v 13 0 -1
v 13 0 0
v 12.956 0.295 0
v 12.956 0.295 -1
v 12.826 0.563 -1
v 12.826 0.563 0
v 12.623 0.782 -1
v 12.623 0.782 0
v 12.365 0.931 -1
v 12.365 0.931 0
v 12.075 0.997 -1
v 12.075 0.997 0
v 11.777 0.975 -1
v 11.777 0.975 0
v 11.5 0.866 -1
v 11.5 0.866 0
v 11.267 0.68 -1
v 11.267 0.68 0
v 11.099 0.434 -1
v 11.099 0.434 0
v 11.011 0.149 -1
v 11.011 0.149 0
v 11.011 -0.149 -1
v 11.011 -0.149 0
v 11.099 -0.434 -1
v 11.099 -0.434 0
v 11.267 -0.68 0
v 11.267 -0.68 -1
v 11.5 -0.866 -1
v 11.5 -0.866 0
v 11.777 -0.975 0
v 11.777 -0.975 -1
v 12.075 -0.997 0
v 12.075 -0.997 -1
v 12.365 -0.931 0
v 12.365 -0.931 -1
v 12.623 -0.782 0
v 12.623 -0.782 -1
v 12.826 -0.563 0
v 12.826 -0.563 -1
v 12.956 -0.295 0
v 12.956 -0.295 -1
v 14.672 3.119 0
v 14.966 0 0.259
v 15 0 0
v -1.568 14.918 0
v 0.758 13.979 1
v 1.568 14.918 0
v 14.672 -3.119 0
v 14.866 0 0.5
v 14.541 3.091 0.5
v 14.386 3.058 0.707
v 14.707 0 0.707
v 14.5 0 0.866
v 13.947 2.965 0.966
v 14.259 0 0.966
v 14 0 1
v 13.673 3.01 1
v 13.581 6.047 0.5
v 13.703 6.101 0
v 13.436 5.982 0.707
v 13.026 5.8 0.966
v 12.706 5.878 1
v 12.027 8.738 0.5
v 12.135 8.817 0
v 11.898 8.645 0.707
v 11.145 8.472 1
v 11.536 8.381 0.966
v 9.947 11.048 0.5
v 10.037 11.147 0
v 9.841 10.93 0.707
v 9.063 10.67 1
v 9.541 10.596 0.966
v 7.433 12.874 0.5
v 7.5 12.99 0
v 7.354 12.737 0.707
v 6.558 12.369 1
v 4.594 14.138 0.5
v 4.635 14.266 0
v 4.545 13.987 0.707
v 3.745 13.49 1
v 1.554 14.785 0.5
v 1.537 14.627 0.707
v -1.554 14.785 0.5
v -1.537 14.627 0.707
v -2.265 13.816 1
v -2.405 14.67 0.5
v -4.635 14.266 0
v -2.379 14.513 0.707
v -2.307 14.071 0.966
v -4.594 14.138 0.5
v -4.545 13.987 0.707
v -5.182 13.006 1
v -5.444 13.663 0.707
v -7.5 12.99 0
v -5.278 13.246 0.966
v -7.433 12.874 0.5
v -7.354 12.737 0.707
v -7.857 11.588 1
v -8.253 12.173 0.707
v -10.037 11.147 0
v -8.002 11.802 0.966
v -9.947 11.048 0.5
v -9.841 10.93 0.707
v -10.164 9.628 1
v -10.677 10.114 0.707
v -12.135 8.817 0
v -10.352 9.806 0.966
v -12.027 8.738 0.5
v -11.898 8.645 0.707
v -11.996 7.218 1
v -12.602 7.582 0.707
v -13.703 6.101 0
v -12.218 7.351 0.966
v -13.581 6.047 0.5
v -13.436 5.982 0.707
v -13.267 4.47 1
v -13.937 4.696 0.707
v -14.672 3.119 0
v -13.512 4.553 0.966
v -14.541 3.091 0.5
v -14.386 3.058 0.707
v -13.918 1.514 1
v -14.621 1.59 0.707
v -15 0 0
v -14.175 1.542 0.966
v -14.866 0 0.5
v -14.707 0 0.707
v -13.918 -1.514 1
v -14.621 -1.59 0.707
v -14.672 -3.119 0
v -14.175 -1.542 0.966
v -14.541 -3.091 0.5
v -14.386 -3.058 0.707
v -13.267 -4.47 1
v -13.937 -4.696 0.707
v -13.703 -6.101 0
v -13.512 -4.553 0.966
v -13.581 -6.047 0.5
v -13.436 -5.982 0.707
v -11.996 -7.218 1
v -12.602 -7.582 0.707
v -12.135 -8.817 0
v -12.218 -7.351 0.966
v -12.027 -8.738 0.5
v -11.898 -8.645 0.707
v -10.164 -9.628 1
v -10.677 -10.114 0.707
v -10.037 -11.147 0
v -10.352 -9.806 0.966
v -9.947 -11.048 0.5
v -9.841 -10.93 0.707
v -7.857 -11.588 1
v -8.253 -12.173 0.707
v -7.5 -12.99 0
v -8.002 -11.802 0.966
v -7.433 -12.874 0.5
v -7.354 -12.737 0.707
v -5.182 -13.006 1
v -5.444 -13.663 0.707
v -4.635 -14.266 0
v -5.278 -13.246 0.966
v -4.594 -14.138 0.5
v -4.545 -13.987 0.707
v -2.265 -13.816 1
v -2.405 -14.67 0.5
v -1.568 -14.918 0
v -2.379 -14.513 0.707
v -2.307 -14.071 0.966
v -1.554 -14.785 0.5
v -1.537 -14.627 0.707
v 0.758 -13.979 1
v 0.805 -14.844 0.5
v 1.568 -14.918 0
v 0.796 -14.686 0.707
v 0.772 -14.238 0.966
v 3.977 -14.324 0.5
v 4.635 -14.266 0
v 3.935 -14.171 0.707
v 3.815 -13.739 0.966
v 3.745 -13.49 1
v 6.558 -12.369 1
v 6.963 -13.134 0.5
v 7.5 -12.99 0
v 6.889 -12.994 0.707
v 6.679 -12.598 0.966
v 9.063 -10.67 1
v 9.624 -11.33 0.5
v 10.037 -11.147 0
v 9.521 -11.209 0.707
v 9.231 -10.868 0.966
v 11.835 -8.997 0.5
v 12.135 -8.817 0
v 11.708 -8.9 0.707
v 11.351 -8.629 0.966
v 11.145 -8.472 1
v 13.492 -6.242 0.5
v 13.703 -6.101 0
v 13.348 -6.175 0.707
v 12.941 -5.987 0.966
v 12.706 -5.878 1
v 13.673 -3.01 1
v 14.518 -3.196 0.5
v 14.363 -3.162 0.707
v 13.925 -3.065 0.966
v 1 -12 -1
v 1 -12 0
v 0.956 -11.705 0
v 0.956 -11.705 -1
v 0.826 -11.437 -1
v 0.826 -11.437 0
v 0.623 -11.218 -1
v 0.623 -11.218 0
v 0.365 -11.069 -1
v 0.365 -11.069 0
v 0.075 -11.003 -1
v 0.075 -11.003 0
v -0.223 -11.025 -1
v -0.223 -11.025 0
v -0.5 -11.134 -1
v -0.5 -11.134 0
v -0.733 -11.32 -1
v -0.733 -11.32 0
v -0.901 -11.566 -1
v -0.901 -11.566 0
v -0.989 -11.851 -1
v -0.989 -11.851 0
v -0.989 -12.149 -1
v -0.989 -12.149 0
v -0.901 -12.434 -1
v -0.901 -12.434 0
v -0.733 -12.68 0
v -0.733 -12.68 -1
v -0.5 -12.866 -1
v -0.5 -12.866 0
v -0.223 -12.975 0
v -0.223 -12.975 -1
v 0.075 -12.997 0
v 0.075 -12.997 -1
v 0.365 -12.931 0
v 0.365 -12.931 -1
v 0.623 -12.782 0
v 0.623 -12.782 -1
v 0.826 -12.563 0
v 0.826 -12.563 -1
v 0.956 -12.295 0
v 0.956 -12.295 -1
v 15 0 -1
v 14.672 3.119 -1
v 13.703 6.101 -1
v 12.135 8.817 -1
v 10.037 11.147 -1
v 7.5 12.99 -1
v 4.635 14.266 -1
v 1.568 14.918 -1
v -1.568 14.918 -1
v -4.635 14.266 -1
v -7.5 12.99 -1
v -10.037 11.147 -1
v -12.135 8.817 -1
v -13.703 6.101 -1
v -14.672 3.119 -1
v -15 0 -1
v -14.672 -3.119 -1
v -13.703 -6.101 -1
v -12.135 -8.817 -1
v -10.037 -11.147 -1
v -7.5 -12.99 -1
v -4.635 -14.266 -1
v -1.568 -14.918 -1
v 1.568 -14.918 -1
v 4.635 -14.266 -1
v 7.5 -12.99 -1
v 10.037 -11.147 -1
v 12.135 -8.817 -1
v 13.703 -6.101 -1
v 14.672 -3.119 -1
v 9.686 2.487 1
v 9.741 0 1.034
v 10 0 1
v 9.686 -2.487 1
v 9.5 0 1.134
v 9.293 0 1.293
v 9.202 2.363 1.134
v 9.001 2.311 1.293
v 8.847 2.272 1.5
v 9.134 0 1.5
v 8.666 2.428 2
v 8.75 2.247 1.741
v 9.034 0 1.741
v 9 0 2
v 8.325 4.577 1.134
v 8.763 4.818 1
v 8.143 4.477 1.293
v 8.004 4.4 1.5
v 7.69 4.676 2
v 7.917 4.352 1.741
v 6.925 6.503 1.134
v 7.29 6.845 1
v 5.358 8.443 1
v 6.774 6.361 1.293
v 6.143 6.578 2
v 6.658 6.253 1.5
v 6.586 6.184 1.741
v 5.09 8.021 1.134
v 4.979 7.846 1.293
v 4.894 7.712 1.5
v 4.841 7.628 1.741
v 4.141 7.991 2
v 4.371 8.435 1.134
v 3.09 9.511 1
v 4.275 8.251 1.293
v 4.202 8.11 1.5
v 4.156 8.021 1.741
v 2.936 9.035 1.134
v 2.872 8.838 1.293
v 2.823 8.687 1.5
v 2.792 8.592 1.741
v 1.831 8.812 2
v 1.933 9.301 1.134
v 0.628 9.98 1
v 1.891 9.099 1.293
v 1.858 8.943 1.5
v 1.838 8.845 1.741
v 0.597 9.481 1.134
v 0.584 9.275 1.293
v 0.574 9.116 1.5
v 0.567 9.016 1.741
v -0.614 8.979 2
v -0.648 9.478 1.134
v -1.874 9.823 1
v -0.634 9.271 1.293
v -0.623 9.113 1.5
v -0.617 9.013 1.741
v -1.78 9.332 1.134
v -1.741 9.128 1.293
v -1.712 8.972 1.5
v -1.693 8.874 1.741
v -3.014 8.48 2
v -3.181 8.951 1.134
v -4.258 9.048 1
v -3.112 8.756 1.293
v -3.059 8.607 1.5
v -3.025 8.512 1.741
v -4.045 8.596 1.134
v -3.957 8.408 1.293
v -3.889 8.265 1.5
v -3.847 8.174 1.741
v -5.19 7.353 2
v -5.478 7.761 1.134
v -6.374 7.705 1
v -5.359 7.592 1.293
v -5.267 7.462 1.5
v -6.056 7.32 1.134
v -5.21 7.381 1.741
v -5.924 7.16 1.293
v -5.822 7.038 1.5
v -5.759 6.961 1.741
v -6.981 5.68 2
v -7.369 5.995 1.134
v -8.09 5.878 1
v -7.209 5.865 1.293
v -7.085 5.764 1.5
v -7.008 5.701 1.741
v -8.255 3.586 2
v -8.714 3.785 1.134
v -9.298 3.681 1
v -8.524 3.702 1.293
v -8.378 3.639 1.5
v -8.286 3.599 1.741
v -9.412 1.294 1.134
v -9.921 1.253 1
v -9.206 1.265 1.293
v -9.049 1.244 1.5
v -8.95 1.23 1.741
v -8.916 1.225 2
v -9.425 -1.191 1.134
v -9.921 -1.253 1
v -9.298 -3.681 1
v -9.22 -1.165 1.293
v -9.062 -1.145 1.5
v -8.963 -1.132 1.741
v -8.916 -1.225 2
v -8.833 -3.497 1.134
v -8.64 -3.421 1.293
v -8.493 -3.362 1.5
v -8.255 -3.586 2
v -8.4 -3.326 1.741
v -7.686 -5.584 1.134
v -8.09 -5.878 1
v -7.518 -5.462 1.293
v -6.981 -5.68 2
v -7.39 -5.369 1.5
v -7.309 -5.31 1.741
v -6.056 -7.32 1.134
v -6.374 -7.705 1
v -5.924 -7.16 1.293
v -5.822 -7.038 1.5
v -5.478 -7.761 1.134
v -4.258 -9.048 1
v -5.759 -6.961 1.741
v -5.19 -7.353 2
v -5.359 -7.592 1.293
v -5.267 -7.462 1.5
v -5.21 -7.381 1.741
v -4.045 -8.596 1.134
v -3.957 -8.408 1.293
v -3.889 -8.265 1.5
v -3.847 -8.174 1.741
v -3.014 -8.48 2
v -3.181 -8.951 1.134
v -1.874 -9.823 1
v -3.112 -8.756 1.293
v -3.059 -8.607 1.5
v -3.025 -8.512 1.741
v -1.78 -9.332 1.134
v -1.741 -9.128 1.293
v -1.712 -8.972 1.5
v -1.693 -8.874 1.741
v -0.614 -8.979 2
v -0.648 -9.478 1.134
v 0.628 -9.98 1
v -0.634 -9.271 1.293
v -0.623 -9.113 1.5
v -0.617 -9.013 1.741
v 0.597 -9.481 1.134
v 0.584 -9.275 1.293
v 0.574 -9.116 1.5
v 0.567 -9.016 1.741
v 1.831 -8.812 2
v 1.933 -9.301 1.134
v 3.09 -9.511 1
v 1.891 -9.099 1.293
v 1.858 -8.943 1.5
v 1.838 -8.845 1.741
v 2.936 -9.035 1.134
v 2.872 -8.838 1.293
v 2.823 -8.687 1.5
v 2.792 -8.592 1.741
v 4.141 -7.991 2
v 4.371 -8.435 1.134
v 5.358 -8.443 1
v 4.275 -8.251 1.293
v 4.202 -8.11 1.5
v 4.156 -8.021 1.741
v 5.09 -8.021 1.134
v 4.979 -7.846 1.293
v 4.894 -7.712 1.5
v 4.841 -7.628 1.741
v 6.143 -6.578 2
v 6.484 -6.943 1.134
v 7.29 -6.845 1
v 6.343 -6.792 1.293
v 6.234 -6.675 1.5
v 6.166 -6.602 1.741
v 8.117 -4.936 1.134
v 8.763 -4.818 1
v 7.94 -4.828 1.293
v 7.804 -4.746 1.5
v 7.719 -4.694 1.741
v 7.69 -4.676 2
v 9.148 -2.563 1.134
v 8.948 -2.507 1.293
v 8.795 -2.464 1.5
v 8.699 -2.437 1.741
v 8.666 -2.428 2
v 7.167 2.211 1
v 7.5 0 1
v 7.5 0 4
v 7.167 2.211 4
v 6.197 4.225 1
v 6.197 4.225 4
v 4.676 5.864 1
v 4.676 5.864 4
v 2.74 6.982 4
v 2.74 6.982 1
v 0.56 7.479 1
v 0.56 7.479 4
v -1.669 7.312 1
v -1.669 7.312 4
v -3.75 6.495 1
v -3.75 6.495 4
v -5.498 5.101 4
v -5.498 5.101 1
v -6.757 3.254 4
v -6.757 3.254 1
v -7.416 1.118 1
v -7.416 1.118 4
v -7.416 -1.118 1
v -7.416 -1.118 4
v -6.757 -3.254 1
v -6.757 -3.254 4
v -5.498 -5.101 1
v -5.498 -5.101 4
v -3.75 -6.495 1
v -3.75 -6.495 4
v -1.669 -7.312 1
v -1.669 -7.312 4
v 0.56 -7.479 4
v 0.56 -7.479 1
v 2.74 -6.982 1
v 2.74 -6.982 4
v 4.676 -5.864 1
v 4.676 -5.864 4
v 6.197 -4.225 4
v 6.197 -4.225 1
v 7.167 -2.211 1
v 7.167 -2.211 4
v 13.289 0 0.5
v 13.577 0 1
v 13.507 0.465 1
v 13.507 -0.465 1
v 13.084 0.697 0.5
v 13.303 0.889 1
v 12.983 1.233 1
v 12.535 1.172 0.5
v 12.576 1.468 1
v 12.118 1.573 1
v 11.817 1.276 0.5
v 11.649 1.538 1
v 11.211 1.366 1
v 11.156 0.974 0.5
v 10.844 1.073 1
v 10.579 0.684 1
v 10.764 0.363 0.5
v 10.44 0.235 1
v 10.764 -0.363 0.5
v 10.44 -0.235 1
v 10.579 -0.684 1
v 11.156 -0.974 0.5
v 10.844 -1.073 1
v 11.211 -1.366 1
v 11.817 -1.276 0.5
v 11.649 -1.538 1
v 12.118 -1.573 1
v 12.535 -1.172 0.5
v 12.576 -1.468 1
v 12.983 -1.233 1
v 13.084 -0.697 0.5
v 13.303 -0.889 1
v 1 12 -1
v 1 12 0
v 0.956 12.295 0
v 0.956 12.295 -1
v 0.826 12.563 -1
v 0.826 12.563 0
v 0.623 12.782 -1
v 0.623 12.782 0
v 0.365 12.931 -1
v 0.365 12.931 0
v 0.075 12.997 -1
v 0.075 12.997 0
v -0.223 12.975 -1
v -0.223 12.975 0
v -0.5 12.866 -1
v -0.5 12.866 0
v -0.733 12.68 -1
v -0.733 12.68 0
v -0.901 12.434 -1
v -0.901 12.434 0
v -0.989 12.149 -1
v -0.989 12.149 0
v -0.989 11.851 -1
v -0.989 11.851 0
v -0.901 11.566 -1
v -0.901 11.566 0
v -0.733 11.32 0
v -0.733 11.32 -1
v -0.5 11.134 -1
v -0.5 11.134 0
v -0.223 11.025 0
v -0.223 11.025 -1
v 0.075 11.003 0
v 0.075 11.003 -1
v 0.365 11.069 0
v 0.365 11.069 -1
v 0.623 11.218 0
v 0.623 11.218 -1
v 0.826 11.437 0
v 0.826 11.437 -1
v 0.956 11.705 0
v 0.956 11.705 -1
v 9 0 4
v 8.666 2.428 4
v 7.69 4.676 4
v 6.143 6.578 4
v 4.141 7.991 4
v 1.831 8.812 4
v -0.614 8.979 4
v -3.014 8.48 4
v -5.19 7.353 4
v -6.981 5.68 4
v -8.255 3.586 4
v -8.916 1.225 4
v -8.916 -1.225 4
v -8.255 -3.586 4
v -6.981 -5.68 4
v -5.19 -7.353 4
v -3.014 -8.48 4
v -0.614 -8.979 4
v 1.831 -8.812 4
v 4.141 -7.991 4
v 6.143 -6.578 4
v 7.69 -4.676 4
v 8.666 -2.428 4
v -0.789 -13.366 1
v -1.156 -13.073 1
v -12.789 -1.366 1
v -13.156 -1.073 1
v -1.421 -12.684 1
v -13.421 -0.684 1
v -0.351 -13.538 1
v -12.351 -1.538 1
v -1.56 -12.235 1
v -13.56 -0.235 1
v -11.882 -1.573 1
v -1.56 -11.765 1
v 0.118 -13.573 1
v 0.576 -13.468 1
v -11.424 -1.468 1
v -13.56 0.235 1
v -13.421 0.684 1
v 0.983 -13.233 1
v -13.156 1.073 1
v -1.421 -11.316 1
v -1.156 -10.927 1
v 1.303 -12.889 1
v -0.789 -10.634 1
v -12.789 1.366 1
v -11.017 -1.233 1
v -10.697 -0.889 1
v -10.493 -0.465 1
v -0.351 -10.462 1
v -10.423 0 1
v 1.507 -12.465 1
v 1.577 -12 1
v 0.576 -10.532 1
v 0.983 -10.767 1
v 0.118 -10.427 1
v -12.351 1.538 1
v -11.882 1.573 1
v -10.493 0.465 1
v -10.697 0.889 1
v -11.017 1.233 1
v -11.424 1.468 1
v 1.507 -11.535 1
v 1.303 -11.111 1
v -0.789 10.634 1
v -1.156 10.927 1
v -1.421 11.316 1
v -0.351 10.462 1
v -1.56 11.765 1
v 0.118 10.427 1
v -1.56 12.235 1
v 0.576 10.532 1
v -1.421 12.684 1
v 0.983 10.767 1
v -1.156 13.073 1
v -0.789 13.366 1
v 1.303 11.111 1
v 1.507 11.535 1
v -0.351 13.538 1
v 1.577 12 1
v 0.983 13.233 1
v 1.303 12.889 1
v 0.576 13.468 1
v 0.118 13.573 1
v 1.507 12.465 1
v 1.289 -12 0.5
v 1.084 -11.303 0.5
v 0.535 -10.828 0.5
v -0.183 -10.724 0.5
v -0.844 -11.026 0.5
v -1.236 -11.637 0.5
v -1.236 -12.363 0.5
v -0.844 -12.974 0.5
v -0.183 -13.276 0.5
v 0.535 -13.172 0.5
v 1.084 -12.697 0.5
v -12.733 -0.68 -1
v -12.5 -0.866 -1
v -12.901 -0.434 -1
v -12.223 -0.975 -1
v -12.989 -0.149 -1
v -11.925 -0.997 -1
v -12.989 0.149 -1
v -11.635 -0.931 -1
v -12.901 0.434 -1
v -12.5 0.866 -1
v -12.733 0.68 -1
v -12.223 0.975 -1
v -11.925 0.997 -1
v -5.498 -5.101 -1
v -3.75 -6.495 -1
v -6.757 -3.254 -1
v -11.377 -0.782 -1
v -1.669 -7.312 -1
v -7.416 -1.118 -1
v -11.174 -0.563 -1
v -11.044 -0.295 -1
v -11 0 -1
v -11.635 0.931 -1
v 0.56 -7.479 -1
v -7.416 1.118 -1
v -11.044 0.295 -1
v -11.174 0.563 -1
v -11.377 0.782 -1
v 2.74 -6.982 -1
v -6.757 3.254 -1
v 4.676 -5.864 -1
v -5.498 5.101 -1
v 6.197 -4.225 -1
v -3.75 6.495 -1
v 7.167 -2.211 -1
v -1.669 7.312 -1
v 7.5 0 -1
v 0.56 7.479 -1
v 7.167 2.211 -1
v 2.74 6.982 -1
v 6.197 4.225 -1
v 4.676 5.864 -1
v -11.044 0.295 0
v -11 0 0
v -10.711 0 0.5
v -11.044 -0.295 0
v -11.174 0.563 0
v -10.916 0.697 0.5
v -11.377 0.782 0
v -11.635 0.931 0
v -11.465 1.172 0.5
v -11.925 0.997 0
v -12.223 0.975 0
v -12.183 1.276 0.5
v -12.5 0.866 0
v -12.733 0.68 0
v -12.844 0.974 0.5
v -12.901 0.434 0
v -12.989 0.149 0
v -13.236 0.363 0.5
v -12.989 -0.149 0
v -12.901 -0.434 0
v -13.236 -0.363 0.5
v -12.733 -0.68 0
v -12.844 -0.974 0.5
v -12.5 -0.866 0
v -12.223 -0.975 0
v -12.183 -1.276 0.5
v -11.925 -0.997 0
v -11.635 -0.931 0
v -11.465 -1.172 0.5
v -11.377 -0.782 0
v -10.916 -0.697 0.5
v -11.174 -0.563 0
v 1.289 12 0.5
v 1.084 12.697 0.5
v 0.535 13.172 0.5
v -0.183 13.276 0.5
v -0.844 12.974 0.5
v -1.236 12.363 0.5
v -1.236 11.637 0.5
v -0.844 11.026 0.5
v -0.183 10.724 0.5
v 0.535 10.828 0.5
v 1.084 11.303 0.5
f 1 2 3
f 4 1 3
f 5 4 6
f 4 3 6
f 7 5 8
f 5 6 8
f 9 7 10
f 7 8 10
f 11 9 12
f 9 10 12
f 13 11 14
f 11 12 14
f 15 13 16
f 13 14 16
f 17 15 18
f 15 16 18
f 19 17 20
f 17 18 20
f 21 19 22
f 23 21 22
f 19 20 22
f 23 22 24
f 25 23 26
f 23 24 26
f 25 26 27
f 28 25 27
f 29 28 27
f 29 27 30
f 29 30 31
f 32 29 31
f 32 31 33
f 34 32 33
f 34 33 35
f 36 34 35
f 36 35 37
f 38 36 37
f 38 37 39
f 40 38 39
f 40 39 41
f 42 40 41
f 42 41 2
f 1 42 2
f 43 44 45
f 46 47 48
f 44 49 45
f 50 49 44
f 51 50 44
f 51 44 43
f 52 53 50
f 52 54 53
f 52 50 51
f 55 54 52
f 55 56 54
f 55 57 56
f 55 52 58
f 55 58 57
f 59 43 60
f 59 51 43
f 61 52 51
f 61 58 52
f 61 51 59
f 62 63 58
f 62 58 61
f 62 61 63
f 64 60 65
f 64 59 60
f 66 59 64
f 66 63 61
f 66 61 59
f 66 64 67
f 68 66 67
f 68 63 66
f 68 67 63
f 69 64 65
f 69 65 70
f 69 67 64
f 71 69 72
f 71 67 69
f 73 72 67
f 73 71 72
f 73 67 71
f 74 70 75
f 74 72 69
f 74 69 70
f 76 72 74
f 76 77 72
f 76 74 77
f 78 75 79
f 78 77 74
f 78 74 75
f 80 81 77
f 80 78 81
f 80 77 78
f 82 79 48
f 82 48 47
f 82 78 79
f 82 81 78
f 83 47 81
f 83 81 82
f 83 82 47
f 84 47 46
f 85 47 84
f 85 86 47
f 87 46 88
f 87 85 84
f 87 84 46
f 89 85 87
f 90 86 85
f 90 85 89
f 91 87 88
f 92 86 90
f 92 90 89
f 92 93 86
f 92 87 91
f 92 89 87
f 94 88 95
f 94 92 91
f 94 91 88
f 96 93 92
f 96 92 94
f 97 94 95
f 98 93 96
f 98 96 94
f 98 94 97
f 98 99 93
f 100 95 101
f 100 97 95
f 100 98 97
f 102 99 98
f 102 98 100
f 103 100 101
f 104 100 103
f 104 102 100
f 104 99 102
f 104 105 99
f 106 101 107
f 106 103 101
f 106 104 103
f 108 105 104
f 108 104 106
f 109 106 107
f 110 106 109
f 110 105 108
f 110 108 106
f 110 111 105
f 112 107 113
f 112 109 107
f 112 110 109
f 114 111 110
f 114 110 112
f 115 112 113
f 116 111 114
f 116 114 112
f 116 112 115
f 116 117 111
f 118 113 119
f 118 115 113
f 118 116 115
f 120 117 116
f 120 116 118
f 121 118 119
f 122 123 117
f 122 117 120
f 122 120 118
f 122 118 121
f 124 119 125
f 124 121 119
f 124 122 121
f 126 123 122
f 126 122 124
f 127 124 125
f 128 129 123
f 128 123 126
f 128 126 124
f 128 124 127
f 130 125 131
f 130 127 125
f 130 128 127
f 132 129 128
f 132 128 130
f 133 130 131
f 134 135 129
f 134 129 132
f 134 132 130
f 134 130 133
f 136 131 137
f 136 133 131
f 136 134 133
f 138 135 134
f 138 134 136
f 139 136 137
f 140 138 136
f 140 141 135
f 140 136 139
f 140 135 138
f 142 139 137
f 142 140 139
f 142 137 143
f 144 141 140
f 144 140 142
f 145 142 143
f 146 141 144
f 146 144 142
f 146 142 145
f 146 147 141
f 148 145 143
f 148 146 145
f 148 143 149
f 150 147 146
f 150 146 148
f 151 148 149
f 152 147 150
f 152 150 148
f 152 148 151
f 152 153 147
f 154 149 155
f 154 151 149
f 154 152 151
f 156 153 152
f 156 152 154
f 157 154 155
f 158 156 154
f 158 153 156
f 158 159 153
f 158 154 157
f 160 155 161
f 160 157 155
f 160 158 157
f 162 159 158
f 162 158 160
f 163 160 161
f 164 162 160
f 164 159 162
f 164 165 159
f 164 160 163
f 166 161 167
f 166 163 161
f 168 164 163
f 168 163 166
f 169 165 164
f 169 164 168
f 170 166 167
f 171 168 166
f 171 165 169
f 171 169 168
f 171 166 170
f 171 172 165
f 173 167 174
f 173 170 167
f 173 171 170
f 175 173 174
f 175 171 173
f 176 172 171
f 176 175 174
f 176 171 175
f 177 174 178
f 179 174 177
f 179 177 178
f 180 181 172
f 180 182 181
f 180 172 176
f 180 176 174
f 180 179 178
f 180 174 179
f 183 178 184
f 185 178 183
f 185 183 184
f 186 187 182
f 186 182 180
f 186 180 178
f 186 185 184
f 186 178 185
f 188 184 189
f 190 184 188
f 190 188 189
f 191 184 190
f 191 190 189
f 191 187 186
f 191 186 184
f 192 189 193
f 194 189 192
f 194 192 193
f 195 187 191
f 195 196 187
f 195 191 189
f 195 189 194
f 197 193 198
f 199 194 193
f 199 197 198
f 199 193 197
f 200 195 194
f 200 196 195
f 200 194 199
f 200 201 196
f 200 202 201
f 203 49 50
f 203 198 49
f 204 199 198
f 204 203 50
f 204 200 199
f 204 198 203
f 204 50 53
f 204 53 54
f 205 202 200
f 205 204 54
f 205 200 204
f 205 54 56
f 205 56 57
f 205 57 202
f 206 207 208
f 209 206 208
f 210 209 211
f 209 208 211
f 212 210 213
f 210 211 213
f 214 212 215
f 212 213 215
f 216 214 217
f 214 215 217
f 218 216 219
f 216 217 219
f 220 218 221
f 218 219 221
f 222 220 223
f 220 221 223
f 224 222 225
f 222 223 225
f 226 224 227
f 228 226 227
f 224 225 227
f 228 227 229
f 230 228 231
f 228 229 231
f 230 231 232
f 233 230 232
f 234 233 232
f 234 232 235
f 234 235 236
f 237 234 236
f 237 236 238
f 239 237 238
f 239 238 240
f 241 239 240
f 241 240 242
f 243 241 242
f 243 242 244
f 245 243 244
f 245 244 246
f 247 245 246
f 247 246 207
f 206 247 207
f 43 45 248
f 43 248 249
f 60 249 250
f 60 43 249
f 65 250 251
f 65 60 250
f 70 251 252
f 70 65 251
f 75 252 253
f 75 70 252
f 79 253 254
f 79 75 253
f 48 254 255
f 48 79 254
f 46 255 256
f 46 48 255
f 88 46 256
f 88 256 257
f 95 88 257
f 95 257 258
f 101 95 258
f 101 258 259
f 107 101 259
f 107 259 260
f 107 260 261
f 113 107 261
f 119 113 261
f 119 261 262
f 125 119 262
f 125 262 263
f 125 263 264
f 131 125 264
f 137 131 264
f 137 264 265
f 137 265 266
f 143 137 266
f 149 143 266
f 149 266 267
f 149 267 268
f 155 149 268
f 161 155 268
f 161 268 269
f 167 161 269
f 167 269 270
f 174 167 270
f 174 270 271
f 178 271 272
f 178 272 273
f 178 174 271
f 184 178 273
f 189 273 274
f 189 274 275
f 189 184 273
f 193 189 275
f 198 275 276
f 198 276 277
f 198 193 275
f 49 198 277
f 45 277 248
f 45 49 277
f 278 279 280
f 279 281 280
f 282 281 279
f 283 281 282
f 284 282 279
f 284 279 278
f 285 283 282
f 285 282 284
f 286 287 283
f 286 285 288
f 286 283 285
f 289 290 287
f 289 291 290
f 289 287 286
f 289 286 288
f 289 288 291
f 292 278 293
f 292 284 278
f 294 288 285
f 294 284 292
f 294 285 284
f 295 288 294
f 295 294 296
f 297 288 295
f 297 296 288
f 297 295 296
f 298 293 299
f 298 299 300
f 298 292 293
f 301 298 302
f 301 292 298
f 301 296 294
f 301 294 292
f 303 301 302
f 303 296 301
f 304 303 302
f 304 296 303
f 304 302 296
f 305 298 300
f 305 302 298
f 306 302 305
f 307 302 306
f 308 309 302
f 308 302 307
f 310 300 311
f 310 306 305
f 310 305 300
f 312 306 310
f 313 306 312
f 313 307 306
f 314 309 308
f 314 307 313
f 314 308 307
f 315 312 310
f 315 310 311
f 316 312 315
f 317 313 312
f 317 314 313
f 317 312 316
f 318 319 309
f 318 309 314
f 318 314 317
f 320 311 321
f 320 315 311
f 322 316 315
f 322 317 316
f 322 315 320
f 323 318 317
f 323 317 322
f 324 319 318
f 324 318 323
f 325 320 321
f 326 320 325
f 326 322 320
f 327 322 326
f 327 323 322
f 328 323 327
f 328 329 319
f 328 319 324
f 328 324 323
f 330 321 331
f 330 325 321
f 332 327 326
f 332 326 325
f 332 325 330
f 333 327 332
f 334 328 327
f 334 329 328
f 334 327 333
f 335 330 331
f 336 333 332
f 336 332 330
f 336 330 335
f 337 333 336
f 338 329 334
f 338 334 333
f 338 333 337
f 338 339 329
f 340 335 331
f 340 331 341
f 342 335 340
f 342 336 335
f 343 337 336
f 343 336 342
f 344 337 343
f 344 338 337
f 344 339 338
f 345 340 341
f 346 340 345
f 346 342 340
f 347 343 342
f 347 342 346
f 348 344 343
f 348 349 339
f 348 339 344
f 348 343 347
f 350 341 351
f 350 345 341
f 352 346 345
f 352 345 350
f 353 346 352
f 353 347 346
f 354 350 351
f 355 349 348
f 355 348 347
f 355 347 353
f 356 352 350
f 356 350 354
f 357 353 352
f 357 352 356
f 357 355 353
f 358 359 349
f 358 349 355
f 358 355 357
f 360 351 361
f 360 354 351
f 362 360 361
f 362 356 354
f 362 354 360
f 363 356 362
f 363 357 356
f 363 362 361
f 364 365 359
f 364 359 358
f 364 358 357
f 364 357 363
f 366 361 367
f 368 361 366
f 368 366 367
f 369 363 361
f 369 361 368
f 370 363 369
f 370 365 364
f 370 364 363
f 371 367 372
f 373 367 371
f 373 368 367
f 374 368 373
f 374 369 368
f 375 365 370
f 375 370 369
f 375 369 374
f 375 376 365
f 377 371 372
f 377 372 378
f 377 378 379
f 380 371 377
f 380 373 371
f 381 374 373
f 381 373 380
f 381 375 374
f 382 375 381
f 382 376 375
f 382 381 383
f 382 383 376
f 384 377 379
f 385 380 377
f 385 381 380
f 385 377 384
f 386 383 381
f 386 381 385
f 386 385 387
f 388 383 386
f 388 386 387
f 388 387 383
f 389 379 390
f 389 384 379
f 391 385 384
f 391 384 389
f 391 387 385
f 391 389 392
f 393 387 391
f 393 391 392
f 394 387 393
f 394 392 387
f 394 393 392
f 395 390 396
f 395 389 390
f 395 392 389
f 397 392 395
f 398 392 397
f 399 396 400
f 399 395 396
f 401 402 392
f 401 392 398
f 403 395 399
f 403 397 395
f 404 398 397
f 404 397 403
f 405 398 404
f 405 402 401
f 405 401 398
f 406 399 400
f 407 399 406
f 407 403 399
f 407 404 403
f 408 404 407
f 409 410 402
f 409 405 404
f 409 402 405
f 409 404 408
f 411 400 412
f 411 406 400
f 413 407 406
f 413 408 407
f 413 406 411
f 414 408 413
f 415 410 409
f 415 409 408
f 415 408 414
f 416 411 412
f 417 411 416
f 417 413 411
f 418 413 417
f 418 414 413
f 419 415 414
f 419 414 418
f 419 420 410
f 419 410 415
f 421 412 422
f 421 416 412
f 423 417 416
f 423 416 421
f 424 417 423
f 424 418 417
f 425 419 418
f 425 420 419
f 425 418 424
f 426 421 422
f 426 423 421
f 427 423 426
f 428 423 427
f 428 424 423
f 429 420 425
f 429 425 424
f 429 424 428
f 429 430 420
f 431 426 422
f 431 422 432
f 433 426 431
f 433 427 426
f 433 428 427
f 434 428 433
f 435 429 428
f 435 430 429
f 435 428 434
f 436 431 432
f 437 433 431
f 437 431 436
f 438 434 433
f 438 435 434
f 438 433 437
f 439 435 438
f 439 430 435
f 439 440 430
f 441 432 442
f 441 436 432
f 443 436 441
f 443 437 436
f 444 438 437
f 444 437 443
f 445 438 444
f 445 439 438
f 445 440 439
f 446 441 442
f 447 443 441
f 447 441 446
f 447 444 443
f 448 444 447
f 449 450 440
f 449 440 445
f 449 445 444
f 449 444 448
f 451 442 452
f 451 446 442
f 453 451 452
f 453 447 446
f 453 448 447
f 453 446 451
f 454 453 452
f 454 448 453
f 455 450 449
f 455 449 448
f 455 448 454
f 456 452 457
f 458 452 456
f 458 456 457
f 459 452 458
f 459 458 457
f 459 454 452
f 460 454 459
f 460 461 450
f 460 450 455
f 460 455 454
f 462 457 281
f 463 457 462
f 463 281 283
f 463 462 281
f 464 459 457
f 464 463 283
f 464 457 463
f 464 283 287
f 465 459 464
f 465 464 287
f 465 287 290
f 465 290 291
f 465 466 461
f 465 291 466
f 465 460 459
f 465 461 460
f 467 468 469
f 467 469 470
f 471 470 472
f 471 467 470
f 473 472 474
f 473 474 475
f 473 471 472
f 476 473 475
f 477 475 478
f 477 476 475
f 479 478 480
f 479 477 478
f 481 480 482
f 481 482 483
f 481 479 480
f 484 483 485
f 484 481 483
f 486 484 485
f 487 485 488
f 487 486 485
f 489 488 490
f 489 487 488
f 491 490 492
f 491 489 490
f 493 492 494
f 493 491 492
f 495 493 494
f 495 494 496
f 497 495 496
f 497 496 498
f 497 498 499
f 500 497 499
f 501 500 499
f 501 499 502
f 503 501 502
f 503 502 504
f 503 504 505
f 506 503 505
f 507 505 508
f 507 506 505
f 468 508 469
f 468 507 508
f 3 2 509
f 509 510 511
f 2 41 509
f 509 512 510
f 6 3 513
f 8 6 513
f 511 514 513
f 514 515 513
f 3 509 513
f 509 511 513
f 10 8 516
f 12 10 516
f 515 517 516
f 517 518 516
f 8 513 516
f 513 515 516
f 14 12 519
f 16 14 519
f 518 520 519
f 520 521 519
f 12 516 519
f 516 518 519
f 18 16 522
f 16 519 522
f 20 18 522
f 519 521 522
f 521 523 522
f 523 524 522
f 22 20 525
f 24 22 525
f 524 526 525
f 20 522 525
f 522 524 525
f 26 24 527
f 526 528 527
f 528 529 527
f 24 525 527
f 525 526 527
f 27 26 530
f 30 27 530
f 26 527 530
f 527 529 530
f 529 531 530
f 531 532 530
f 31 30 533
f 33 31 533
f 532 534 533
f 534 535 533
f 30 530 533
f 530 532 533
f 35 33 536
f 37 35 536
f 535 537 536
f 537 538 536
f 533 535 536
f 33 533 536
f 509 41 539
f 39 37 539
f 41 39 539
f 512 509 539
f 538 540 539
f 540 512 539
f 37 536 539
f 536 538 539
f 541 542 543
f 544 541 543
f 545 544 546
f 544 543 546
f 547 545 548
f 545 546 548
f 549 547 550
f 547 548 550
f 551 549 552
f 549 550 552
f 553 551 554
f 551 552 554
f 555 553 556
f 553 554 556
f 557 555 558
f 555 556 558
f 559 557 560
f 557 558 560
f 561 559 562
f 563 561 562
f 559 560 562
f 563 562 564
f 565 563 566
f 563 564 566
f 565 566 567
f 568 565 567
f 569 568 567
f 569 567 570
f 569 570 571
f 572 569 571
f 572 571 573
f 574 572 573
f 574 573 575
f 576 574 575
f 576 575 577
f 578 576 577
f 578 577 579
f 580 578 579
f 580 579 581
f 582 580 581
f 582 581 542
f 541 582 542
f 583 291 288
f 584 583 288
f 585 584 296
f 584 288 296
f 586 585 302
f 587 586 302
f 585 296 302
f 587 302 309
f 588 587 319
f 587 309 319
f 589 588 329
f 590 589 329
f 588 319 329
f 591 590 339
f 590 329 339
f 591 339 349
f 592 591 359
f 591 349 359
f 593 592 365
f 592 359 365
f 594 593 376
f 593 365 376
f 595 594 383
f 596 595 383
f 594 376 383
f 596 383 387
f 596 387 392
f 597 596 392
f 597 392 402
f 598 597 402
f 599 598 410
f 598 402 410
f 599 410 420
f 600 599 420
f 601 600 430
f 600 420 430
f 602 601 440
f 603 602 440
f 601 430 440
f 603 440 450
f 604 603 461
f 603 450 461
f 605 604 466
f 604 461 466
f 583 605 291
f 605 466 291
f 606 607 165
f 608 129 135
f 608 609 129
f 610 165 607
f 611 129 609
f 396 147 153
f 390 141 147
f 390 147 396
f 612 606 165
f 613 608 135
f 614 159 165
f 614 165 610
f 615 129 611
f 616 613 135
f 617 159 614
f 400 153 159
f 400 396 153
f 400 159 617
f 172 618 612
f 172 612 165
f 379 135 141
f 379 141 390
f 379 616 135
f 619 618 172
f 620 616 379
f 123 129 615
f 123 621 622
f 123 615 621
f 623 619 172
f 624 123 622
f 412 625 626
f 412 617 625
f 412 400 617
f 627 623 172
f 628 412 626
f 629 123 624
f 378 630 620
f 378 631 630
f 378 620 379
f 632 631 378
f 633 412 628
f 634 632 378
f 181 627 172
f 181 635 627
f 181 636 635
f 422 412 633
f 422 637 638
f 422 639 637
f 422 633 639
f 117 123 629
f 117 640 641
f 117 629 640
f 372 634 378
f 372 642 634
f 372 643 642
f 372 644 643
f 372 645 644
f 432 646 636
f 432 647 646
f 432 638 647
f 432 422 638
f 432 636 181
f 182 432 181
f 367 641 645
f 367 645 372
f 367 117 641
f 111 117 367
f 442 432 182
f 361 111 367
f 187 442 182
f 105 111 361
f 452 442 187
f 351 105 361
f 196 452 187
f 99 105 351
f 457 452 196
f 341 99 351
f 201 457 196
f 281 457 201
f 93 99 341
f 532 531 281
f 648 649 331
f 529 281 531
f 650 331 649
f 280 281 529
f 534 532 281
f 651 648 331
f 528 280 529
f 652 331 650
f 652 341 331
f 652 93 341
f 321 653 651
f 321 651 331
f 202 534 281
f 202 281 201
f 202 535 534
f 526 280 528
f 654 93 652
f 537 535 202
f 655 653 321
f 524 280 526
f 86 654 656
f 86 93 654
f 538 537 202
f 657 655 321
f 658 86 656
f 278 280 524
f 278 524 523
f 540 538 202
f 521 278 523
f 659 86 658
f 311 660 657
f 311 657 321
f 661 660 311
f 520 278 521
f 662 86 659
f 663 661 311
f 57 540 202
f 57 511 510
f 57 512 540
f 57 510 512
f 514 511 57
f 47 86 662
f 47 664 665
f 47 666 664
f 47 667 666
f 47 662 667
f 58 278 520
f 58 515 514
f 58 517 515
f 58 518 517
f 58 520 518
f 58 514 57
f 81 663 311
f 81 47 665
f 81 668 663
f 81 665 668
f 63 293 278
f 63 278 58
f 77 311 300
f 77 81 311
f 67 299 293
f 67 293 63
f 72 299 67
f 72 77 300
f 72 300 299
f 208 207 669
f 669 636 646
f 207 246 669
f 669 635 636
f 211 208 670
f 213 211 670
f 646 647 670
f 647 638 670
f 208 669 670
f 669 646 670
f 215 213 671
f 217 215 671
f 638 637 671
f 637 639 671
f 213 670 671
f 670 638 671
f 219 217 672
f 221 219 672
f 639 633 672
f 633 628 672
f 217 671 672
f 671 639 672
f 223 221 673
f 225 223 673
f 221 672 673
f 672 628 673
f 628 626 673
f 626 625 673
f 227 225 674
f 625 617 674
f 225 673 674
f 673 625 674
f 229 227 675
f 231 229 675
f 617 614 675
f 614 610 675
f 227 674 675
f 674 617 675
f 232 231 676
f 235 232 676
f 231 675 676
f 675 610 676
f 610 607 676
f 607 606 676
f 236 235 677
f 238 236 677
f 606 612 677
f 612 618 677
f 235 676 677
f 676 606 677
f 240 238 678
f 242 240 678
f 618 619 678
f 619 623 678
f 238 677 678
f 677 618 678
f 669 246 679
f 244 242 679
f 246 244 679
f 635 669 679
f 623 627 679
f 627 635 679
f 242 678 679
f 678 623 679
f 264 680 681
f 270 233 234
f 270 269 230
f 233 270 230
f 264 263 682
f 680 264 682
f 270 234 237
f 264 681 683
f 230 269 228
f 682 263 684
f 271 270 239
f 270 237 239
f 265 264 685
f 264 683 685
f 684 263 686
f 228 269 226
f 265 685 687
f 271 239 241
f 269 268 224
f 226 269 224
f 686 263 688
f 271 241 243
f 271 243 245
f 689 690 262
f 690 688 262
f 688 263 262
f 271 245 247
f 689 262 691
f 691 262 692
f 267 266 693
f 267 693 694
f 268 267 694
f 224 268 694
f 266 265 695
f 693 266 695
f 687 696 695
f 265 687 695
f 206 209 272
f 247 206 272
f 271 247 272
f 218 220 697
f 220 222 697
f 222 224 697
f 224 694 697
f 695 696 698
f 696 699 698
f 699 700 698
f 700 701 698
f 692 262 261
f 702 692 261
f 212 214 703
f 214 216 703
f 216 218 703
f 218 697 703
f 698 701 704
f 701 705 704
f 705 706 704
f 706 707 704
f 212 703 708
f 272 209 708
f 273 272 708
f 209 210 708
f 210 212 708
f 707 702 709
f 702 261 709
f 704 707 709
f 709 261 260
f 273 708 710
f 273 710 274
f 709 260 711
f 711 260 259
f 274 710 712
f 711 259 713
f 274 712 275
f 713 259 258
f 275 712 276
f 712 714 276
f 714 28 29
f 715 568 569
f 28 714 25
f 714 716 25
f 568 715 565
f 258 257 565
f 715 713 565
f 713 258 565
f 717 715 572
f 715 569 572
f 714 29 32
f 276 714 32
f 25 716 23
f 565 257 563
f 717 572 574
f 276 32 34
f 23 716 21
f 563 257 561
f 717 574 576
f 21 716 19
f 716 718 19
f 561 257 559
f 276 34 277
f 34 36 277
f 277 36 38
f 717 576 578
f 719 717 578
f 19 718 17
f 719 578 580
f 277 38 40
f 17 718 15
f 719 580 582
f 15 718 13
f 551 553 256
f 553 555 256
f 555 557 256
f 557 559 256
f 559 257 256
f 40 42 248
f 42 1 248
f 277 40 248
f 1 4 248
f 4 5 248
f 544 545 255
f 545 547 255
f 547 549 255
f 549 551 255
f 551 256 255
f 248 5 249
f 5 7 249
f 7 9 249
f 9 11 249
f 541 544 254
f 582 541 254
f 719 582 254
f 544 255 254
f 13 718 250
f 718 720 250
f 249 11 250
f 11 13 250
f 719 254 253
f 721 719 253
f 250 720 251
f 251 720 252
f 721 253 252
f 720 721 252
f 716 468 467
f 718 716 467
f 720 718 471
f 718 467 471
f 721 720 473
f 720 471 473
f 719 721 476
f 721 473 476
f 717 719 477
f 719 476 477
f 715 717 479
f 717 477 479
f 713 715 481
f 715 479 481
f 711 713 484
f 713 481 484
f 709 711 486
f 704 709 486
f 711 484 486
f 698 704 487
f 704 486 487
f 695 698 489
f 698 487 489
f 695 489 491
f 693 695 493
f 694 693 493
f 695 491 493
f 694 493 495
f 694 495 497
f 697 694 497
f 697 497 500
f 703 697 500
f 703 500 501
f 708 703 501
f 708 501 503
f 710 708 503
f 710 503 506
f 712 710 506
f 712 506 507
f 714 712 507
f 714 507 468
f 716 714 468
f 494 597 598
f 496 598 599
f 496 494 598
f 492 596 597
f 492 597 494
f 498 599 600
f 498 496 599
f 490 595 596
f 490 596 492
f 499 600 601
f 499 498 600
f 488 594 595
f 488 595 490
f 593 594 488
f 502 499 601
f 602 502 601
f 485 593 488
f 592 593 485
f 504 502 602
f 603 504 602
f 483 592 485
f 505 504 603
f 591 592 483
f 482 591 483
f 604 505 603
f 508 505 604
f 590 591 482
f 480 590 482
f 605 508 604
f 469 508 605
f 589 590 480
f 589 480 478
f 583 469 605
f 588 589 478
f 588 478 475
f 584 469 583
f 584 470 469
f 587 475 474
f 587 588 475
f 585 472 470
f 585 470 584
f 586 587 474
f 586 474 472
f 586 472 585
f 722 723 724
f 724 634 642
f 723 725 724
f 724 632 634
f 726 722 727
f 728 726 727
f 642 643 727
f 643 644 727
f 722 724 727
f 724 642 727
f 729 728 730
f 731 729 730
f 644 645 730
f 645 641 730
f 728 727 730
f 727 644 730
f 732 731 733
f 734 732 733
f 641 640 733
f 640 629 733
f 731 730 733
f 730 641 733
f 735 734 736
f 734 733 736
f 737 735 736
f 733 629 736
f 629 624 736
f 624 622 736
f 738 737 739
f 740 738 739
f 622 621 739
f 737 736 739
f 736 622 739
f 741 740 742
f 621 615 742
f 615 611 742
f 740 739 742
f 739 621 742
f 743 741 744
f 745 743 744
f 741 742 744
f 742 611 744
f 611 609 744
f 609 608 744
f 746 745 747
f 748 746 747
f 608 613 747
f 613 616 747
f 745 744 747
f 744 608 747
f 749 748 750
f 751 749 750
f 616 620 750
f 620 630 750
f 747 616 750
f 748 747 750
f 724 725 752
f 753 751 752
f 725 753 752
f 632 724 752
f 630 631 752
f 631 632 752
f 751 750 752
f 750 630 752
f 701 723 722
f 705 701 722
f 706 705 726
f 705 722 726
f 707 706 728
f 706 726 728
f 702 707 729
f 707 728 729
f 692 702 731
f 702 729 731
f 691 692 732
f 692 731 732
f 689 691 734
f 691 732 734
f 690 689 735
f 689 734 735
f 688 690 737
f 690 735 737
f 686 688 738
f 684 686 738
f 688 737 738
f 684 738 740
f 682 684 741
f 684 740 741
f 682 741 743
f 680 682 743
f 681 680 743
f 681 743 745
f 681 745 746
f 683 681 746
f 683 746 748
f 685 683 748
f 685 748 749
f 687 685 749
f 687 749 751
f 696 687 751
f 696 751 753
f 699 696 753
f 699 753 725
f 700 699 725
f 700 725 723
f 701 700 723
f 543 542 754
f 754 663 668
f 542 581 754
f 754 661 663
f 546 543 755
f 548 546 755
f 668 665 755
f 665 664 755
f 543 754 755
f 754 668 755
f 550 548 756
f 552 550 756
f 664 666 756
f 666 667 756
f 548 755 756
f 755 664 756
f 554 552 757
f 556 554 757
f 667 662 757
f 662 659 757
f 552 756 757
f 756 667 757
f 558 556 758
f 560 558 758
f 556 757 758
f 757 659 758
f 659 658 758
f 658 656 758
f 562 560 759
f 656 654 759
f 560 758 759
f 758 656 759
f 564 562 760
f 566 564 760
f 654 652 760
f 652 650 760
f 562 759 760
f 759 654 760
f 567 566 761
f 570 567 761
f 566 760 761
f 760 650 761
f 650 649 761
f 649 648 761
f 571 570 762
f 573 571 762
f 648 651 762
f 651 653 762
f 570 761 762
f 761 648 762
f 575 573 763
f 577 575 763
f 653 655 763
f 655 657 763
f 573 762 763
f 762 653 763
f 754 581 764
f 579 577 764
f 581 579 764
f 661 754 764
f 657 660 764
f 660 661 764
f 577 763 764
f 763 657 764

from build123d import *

# Parameters (mm, degrees)
F0_R          = 15
F1_DEPTH      = 1
F1_DEPTH_BACK = 1
F2_R          = 1
F3_DEPTH      = 2
F3_DEPTH_BACK = 2
F3_TAPER_BACK = -30
F4_R          = 9
F4_R_2        = 7.5
F5_DEPTH      = 3
F6_DEPTH      = 5
F7_R          = 0.99999


# Not quite as in the source:
# - a fillet or chamfer is up to 0.001 mm smaller than in the source, because OpenCascade refuses the exact size


with BuildPart() as f1:
    # F0 (on Top) → F1 (new body, two sides)
    with BuildSketch(Plane.XY) as f1_sk:
        Circle(F0_R)
    extrude(amount=F1_DEPTH)
    extrude(f1_sk.sketch, amount=-F1_DEPTH_BACK)

    # F2 (on Top) → F3 (cut, two sides)
    with BuildSketch(Plane.XY) as f3_sk:
        with Locations((12, 0)):
            Circle(F2_R)
        with Locations((0, 12)):
            Circle(F2_R)
        with Locations((-12, 0)):
            Circle(F2_R)
        with Locations((0, -12)):
            Circle(F2_R)
    extrude(amount=-F3_DEPTH, mode=Mode.SUBTRACT)
    extrude(f3_sk.sketch, amount=F3_DEPTH_BACK, taper=F3_TAPER_BACK, mode=Mode.SUBTRACT)

    # F4 (on face) → F5 (join)
    with BuildSketch(Plane.XY.offset(1)):
        Circle(F4_R)
        Circle(F4_R_2, mode=Mode.SUBTRACT)
    extrude(amount=F5_DEPTH)

    # F6 (cut): a face of the model
    f6_faces = [f1.faces().sort_by_distance(p)[0] for p in [
        (0, 0, 1),
    ]]
    extrude(f6_faces, amount=-F6_DEPTH, mode=Mode.SUBTRACT)

    # F7 (radius 1 in the source; OpenCascade refuses exactly that, so slightly less here)
    f7_edges = [f1.edges().sort_by_distance(p)[0] for p in [
        (-15, 0, 1),
        (-9, 0, 1),
    ]]
    fillet(f7_edges, radius=F7_R)


solid = f1.part
